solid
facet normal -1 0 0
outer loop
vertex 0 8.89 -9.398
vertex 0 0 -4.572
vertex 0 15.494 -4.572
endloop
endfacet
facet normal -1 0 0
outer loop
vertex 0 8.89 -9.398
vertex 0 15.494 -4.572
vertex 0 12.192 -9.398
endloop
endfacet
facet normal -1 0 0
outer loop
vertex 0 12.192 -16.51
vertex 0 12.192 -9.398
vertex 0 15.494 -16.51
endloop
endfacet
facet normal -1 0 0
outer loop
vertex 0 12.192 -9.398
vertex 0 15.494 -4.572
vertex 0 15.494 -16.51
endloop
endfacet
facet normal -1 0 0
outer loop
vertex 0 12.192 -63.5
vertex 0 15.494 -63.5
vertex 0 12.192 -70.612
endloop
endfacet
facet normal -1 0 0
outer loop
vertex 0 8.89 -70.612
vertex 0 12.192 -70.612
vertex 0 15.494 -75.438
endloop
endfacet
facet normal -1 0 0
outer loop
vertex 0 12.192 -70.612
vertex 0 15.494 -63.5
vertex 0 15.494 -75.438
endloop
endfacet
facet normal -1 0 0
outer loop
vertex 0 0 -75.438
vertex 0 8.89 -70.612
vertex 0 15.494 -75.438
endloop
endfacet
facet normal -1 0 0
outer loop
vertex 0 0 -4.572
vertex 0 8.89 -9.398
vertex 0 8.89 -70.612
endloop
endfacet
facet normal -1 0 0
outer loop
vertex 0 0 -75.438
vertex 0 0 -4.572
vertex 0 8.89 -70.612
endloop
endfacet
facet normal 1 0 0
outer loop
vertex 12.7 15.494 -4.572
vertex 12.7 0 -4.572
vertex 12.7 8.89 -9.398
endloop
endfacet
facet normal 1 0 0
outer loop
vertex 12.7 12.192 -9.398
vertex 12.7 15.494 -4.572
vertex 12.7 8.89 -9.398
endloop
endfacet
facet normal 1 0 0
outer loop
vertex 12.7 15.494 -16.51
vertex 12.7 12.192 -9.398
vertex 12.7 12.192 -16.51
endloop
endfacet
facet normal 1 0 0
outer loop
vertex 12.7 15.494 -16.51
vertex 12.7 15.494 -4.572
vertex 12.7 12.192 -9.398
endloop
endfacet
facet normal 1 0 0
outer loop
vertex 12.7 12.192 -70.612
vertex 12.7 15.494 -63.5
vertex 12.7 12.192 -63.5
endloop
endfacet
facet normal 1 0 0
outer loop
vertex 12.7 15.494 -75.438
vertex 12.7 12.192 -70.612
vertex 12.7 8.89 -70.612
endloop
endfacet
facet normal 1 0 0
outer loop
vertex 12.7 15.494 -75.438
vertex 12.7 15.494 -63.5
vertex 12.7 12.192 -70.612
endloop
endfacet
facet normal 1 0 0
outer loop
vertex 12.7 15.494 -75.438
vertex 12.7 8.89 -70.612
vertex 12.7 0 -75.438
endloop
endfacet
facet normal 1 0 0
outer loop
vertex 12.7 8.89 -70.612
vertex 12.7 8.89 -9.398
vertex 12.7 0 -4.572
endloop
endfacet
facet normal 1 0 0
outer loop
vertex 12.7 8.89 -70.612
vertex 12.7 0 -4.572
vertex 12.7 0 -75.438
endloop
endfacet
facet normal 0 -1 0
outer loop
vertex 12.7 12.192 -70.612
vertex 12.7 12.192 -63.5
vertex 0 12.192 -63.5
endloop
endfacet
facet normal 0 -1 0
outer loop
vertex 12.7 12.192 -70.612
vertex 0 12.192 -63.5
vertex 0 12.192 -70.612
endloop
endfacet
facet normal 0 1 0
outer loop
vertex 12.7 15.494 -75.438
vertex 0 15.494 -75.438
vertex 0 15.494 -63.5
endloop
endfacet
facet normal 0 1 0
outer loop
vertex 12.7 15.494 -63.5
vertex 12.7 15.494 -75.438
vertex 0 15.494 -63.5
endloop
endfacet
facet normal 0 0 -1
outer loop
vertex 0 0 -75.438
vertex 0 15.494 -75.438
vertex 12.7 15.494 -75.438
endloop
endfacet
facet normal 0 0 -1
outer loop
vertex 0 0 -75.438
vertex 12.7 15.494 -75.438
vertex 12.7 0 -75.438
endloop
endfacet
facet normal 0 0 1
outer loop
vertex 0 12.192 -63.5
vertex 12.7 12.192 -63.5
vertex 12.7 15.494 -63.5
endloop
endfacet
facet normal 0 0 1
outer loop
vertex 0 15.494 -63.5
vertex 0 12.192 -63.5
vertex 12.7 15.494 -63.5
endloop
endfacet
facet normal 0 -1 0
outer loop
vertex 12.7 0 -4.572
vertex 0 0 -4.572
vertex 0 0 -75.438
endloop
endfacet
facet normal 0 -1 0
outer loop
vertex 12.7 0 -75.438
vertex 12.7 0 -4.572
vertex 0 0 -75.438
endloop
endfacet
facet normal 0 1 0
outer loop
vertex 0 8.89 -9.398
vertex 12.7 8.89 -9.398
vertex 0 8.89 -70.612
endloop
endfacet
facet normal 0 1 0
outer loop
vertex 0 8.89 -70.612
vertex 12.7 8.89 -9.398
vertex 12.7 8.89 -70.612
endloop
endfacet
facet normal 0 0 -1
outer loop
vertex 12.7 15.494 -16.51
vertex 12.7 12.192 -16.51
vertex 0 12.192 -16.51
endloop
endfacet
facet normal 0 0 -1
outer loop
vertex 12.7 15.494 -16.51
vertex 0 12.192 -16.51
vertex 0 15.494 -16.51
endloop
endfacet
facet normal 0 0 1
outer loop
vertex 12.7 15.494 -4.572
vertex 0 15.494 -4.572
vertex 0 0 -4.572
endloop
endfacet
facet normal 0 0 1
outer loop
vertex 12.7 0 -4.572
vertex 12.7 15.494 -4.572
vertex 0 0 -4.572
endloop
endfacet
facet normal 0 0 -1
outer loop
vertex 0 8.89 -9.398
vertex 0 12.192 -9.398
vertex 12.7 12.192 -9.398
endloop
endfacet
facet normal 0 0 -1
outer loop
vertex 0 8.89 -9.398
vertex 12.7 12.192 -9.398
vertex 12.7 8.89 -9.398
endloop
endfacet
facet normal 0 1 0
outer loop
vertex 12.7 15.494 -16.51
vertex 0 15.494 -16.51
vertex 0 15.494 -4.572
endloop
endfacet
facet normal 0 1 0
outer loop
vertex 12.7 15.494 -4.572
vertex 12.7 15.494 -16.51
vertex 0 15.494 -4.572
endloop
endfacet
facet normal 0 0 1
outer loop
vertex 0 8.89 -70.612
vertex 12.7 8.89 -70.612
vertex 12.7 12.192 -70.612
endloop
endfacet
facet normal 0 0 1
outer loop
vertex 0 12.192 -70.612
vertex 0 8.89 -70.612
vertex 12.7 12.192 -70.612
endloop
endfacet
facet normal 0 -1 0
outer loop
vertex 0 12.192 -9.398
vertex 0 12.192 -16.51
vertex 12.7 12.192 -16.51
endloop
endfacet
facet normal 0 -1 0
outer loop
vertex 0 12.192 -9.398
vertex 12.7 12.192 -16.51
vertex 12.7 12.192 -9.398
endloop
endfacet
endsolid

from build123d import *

# Parameters (mm, degrees)
BOSS_EXTRUDE1_DEPTH = 12.7
BOSS_EXTRUDE3_DEPTH = 12.7
CUT_EXTRUDE1_REACH  = 14.7
CUT_EXTRUDE2_REACH  = 14.7
SKETCH6_W           = 7.112
SKETCH6_H           = 3.302
BOSS_EXTRUDE4_DEPTH = 3.175
SKETCH7_W           = 7.112
SKETCH7_H           = 3.302
BOSS_EXTRUDE5_DEPTH = 3.175
CUT_EXTRUDE3_REACH  = 14.7
SKETCH8_W           = 7.112
SKETCH8_H           = 3.302
CUT_EXTRUDE4_REACH  = 14.7
SKETCH9_W           = 7.112
SKETCH9_H           = 3.302


with BuildPart() as part:
    # Sketch1 → Boss-Extrude1 (new body)
    with BuildSketch(Plane(origin=(0, 0, 0), x_dir=(0, 0, -1), z_dir=(1, 0, 0))):
        Polygon((0, 0), (80.01, 0), (80.01, 19.05), (71.12, 19.05), (71.12, 8.89), (8.89, 8.89), (8.89, 19.05), (0, 19.05), align=None)
    extrude(amount=BOSS_EXTRUDE1_DEPTH)

    # Sketch2 → Boss-Extrude3 (add)
    with BuildSketch(Plane.ZY):
        Polygon((-63.5, 12.192), (-70.612, 12.192), (-70.612, 8.89), (-74.93, 8.89), (-74.93, 15.494), (-63.5, 15.494), align=None)
        Polygon((-16.51, 12.192), (-9.398, 12.192), (-9.398, 8.89), (-5.08, 8.89), (-5.08, 15.494), (-16.51, 15.494), align=None)
    extrude(amount=-BOSS_EXTRUDE3_DEPTH)

    # Sketch4 → Cut-Extrude1 (cut, up to next)
    with BuildSketch(Plane.ZY, mode=Mode.PRIVATE) as cut_extrude1_sk1:
        Polygon((-71.12, 15.494), (-75.438, 15.494), (-75.438, 0), (-80.01, 0), (-80.01, 19.05), (-71.12, 19.05), align=None)
    cut_extrude1_tool1 = extrude(cut_extrude1_sk1.sketch, amount=-CUT_EXTRUDE1_REACH, mode=Mode.PRIVATE) & part.part
    add(cut_extrude1_tool1.solids().sort_by_distance((0, 10.686074, -77.05781))[0], mode=Mode.SUBTRACT)

    # Sketch5 → Cut-Extrude2 (cut, up to next)
    with BuildSketch(Plane.ZY, mode=Mode.PRIVATE) as cut_extrude2_sk1:
        Polygon((-8.89, 15.494), (-4.572, 15.494), (-4.572, 0), (0, 0), (0, 19.05), (-8.89, 19.05), align=None)
    cut_extrude2_tool1 = extrude(cut_extrude2_sk1.sketch, amount=-CUT_EXTRUDE2_REACH, mode=Mode.PRIVATE) & part.part
    add(cut_extrude2_tool1.solids().sort_by_distance((0, 10.686074, -2.95219))[0], mode=Mode.SUBTRACT)

    # Sketch6 → Boss-Extrude4 (add)
    with BuildSketch(Plane(origin=(12.7, 0, 0), x_dir=(0, 0, -1), z_dir=(1, 0, 0))):
        with Locations((12.954, 10.541)):
            Rectangle(SKETCH6_W, SKETCH6_H)
    extrude(amount=-BOSS_EXTRUDE4_DEPTH)

    # Sketch7 → Boss-Extrude5 (add)
    with BuildSketch(Plane(origin=(12.7, 0, 0), x_dir=(0, 0, -1), z_dir=(1, 0, 0))):
        with Locations((67.056, 10.541)):
            Rectangle(SKETCH7_W, SKETCH7_H)
    extrude(amount=-BOSS_EXTRUDE5_DEPTH)

    # Sketch8 → Cut-Extrude3 (cut, up to next)
    with BuildSketch(Plane(origin=(12.7, 0, 0), x_dir=(0, 0, -1), z_dir=(1, 0, 0)), mode=Mode.PRIVATE) as cut_extrude3_sk1:
        with Locations((12.954, 10.541)):
            Rectangle(SKETCH8_W, SKETCH8_H)
    cut_extrude3_tool1 = extrude(cut_extrude3_sk1.sketch, amount=-CUT_EXTRUDE3_REACH, mode=Mode.PRIVATE) & part.part
    add(cut_extrude3_tool1.solids().sort_by_distance((12.7, 10.541, -12.954))[0], mode=Mode.SUBTRACT)

    # Sketch9 → Cut-Extrude4 (cut, up to next)
    with BuildSketch(Plane(origin=(12.7, 0, 0), x_dir=(0, 0, -1), z_dir=(1, 0, 0)), mode=Mode.PRIVATE) as cut_extrude4_sk1:
        with Locations((67.056, 10.541)):
            Rectangle(SKETCH9_W, SKETCH9_H)
    cut_extrude4_tool1 = extrude(cut_extrude4_sk1.sketch, amount=-CUT_EXTRUDE4_REACH, mode=Mode.PRIVATE) & part.part
    add(cut_extrude4_tool1.solids().sort_by_distance((12.7, 10.541, -67.056))[0], mode=Mode.SUBTRACT)


solid = part.part
